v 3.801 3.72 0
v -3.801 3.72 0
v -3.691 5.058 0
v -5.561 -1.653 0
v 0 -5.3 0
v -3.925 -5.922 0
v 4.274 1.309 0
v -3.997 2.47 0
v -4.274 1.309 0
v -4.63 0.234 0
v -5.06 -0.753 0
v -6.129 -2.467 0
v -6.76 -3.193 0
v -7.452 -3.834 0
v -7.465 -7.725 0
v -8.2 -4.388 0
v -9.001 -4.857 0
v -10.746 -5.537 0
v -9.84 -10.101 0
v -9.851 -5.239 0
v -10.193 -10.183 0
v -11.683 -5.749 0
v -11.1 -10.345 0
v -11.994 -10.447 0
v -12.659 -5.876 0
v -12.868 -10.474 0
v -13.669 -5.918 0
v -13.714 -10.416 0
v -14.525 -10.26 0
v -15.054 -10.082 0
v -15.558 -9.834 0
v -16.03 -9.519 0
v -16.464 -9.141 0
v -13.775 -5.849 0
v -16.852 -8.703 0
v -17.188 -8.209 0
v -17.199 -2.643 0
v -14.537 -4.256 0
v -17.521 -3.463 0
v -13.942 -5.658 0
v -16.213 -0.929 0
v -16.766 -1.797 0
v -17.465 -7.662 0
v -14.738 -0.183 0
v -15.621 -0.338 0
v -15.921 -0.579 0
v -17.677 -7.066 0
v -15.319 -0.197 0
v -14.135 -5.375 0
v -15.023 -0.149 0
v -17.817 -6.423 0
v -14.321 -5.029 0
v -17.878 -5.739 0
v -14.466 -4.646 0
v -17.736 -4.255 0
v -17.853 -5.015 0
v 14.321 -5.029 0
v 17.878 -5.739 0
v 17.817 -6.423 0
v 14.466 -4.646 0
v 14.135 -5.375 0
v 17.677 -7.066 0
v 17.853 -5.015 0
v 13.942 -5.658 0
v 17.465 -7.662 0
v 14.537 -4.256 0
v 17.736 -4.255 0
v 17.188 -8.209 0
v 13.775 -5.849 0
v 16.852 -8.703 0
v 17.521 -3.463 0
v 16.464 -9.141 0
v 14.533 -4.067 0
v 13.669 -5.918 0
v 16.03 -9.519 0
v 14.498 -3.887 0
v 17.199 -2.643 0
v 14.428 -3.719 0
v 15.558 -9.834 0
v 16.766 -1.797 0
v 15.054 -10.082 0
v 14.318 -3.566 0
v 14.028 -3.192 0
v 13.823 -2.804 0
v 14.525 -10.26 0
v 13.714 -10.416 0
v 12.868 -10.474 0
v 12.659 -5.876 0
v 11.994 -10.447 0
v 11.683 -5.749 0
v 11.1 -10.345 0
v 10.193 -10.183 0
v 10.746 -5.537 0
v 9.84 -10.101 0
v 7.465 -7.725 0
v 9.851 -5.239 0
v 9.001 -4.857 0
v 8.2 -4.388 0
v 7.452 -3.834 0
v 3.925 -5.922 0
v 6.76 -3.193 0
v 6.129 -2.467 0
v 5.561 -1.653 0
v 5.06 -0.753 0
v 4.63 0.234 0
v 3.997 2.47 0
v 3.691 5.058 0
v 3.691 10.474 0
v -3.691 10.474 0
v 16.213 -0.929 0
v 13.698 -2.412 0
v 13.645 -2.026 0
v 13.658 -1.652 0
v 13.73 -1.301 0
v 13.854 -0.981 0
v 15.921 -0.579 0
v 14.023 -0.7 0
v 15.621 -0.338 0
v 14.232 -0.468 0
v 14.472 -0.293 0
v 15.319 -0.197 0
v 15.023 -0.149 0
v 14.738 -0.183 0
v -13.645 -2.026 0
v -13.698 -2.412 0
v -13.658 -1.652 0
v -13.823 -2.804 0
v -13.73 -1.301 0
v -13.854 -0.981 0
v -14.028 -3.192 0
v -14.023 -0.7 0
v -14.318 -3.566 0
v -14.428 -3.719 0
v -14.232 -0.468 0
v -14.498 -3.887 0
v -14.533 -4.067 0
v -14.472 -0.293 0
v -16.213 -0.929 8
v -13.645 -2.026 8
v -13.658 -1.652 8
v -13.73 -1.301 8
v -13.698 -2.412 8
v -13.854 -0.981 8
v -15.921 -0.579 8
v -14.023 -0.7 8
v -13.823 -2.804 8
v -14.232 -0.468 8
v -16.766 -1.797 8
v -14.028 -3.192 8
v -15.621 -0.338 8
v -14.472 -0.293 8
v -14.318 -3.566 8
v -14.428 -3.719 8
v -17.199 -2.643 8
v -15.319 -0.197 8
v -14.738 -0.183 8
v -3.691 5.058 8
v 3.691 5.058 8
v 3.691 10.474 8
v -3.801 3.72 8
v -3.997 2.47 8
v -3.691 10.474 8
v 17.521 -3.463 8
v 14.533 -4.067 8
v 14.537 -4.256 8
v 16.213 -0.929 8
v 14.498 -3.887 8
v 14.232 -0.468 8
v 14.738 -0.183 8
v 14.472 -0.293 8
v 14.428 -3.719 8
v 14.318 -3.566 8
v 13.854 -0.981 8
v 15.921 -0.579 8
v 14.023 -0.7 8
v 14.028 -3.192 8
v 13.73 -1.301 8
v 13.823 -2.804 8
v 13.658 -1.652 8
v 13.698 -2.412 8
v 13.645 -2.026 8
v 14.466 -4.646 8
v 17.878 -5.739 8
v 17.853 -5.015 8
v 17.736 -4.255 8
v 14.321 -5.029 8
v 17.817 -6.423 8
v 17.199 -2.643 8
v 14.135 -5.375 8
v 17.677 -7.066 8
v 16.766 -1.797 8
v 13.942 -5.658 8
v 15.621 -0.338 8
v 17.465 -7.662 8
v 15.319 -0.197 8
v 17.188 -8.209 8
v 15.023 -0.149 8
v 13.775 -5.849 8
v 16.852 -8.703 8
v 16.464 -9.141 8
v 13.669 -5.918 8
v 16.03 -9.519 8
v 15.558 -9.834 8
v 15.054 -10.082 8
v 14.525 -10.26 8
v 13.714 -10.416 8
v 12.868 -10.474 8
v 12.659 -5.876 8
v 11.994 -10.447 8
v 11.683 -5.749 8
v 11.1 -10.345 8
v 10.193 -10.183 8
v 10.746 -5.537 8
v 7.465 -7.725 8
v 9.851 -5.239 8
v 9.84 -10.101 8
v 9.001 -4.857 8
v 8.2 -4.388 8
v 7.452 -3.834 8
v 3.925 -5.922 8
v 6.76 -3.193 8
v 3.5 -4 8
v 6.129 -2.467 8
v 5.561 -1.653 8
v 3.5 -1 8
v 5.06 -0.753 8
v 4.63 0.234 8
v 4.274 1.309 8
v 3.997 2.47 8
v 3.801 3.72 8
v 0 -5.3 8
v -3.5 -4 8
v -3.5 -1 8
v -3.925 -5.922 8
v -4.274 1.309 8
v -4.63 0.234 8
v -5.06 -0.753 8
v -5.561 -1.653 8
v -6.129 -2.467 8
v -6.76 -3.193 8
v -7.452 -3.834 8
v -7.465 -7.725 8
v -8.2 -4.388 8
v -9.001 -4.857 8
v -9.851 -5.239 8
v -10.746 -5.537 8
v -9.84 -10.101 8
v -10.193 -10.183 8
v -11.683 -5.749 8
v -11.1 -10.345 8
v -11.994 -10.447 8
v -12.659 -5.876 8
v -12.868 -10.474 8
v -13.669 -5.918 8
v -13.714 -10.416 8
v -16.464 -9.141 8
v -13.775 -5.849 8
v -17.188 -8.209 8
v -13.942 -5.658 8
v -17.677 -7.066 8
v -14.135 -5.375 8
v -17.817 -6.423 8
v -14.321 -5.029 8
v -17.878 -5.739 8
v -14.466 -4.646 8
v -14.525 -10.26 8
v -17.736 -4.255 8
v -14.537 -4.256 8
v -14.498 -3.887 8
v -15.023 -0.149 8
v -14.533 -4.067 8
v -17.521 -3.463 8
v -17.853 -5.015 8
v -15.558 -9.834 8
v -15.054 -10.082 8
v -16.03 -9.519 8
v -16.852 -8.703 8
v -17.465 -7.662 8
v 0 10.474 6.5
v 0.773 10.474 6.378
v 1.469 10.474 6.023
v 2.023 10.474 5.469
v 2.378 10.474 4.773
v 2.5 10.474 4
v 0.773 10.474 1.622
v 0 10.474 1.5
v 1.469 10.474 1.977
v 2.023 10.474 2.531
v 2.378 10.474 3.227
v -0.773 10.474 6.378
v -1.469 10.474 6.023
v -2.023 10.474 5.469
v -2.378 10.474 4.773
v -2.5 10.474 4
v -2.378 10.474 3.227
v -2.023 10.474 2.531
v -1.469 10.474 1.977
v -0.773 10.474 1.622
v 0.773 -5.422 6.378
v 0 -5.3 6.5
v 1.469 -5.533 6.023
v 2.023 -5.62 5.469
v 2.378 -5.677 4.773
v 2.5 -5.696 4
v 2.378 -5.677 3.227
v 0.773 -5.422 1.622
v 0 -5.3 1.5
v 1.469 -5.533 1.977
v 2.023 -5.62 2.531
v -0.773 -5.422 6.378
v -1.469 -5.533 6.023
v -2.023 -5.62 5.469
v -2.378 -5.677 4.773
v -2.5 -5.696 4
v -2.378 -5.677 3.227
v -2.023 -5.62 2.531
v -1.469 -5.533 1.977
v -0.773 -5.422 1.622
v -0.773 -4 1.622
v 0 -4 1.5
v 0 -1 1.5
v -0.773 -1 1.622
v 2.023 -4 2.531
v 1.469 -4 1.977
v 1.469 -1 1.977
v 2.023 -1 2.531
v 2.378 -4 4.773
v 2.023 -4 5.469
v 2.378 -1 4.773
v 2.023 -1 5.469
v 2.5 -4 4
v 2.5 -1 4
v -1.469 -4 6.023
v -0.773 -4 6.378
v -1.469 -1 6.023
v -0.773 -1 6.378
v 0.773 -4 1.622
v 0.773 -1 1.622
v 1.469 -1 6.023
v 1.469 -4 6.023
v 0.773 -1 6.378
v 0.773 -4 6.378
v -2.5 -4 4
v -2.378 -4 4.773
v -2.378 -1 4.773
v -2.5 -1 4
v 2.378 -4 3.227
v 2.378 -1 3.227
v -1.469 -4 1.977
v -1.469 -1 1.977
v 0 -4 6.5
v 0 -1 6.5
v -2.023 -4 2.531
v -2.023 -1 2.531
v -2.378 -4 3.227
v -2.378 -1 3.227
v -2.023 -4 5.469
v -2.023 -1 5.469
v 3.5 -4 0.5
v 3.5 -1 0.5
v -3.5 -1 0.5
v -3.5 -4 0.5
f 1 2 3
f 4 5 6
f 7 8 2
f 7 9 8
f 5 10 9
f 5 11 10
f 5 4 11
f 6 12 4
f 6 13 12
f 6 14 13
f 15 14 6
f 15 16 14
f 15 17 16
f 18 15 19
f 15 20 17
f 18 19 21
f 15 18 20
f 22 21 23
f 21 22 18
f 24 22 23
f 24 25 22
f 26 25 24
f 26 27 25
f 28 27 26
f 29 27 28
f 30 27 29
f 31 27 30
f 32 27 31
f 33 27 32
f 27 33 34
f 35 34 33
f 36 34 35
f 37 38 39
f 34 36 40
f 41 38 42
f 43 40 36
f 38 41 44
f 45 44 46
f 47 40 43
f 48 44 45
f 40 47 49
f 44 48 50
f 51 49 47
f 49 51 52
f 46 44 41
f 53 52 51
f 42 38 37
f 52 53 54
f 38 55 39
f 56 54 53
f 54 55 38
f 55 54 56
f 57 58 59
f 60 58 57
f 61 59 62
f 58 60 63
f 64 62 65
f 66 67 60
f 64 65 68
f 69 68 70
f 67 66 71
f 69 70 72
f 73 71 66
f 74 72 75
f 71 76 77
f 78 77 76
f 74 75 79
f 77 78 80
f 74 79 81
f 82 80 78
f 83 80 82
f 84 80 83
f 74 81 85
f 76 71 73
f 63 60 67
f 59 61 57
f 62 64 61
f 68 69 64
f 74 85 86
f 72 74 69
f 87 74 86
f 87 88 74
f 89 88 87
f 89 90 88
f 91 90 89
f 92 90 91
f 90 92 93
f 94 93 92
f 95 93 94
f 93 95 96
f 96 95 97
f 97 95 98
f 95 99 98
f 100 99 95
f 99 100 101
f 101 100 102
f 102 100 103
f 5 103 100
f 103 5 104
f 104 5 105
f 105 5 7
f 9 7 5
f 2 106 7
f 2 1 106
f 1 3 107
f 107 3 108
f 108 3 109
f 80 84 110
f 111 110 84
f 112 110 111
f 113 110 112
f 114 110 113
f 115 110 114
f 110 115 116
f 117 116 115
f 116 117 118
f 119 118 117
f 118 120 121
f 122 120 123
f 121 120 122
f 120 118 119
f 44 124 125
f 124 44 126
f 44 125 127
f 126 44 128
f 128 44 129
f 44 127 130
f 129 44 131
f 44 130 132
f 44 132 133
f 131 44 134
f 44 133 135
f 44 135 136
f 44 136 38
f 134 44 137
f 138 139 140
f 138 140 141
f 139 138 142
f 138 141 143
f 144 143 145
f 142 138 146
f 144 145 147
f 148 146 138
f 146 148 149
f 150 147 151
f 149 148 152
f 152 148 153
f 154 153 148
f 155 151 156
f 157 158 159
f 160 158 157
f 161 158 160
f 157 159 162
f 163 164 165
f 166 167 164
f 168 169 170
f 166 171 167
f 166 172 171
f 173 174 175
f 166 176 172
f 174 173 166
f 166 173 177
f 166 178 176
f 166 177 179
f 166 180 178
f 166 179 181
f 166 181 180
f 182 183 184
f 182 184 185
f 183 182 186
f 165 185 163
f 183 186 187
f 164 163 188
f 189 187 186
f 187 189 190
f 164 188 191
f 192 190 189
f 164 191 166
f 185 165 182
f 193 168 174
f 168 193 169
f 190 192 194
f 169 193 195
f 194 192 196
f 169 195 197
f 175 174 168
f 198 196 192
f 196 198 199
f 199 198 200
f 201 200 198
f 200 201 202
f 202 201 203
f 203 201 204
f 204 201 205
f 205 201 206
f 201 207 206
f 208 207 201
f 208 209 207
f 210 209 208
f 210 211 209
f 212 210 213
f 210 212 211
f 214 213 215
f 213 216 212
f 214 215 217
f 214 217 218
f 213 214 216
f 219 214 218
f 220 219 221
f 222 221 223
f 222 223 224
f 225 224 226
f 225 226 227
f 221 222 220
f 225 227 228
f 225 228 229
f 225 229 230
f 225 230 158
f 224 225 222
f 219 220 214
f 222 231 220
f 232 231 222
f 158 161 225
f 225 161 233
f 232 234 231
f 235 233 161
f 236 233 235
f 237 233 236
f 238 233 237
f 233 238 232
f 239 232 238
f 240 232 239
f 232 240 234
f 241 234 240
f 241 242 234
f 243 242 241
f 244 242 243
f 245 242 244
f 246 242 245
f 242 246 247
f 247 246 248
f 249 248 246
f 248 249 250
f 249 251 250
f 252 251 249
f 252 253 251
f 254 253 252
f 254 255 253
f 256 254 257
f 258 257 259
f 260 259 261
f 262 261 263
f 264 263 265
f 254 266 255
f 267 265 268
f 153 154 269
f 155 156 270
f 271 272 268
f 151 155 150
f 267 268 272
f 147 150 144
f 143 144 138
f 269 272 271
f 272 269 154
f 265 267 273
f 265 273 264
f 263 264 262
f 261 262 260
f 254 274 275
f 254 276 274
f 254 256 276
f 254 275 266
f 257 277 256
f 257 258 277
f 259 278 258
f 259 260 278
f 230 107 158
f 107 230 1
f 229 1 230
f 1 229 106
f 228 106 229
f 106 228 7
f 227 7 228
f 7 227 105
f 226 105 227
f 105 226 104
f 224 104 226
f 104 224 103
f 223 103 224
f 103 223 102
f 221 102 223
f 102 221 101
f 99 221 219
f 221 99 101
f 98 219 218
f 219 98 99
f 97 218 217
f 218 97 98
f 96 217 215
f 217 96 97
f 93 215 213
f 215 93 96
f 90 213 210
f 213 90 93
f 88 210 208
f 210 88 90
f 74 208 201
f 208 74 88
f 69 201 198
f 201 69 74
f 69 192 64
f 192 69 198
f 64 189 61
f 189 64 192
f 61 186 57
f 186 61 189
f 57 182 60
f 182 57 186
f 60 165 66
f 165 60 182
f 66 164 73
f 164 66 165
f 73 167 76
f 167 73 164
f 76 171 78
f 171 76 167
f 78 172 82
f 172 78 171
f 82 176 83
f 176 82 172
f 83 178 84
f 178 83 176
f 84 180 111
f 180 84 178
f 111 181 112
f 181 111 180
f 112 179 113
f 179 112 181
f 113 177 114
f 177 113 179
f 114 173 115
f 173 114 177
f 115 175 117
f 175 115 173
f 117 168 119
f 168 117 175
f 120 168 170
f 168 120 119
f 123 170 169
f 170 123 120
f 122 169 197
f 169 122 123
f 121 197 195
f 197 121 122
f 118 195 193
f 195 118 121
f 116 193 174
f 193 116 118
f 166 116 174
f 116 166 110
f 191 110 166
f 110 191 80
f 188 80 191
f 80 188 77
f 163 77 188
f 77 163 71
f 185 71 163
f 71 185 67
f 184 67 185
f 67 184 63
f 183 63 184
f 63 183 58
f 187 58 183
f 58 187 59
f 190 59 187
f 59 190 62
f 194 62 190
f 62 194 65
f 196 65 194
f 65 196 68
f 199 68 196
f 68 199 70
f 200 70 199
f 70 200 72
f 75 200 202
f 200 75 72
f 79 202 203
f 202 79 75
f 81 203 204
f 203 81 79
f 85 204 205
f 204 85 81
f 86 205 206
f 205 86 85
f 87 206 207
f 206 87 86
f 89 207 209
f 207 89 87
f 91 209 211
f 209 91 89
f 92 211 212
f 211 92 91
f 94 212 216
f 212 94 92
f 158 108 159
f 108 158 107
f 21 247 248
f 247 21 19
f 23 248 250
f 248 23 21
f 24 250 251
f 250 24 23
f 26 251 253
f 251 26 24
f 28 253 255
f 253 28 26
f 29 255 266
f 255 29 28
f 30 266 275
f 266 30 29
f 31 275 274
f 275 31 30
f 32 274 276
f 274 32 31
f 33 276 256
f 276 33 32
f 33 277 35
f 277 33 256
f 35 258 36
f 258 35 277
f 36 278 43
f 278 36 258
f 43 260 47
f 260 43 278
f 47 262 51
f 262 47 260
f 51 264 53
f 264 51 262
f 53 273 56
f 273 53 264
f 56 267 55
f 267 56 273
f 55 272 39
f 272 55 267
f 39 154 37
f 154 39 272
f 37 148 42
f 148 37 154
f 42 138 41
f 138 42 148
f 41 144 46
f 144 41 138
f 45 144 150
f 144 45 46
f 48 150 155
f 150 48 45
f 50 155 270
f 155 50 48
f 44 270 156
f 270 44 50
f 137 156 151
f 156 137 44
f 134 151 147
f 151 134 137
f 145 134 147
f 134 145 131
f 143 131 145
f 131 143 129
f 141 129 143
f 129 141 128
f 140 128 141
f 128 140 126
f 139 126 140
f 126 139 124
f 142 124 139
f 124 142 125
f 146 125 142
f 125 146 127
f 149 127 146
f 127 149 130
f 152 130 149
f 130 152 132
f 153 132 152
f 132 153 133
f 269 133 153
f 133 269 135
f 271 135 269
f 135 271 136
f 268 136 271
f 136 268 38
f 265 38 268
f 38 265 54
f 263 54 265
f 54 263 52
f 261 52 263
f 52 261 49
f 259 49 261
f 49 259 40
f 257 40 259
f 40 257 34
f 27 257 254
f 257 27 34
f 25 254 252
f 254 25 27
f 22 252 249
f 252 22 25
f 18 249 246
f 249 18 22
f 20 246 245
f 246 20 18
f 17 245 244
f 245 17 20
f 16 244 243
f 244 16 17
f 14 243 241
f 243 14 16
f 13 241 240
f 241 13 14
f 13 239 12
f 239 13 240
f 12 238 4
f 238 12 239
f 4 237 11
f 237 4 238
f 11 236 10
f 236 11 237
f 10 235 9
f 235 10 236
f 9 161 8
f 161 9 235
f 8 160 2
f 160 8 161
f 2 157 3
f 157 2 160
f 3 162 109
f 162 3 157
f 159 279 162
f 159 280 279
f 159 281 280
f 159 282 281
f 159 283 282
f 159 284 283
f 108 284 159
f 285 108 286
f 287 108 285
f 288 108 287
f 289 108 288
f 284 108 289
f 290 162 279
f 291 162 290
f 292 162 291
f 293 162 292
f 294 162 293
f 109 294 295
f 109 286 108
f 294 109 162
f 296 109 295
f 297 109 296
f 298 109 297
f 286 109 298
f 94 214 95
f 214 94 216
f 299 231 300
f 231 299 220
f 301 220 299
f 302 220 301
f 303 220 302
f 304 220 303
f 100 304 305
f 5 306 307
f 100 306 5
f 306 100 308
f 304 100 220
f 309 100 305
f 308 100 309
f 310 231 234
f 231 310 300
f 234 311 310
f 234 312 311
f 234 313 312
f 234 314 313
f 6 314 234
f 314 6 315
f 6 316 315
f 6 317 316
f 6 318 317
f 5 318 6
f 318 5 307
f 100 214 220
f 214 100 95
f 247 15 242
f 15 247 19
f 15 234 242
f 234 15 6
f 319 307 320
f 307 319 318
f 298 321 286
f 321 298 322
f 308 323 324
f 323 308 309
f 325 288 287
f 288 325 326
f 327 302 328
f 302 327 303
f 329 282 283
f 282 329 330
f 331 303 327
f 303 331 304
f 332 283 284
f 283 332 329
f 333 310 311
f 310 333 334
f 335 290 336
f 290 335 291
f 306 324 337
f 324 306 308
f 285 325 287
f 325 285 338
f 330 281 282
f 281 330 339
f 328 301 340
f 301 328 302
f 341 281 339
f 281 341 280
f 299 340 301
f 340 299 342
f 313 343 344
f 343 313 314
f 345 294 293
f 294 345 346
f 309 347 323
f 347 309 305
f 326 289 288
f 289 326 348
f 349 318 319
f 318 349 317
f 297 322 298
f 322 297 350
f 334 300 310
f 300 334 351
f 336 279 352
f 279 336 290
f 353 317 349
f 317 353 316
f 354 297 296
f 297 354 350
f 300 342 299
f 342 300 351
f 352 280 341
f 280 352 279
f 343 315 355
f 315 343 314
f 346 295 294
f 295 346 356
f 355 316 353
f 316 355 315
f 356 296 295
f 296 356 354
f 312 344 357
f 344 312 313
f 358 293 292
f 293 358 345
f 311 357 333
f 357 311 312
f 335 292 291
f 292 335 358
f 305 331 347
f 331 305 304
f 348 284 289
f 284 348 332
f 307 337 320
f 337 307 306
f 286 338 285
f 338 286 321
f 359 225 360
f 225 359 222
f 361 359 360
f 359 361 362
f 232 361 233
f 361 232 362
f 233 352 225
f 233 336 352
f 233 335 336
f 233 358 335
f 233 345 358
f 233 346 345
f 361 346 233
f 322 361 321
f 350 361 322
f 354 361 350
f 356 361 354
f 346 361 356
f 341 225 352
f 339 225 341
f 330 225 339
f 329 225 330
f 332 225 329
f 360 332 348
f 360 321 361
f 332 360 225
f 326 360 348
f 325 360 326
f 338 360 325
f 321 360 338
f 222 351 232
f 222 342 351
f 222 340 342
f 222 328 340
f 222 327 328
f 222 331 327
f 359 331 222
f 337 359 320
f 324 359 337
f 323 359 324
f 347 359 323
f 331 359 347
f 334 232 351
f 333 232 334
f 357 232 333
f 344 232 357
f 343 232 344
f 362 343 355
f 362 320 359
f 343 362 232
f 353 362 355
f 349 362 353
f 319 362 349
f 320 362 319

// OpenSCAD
// fudge value is used to ensure that subtracted solids are a tad taller
// in the z dimension than the polygon being subtracted from.  This helps
// keep the resulting .stl file manifold.
fudge = 0.1;

//Smoothing
$fn=20;

//Height
hi = 8;

//Radius of the bars
bar_radius = 25.4 / 2;

//Bar notch shift to tweak (-18)
notch_shift = -18;

//Bolt length (whatever)
bolt_length = 200;

//Bolt radius
bolt_radius = 5 / 2;

//Nut thickness
nut_thick = 3;

//Nut width
nut_width = 7;

//Scale along x (0.35)
x_squish = 0.35;

//Scale along y (0.5)
y_squish = 0.5;


module poly_path41363(h) //Curvy bit drawn as vector and exported with https://www.thingiverse.com/thing:25036
{
  scale([25.4/90, -25.4/90, 1]) union()
  {
    linear_extrude(height=h)
      polygon([[37.363225,-74.226732],[37.363225,-35.840942],[38.480245,-26.362684],[40.461475,-17.507401],[43.270197,-9.273511],[46.869693,-1.659429],[51.223243,5.336428],[56.294131,11.715643],[62.045637,17.479799],[68.441043,22.630480],[75.443630,27.169268],[83.016680,31.097748],[91.123475,34.417502],[99.727296,37.130115],[108.791425,39.237168],[118.279144,40.740246],[128.153733,41.640932],[138.378475,41.940808],[139.457596,41.446563],[141.146060,40.097442],[143.102438,38.093873],[144.985304,35.636278],[146.453230,32.925085],[147.164788,30.160717],[147.130234,28.821225],[146.778553,27.543600],[146.067066,26.352893],[144.953095,25.274158],[142.014369,22.617386],[139.944666,19.870623],[138.675990,17.095690],[138.140340,14.354403],[138.269721,11.708583],[138.996132,9.220048],[140.251577,6.950616],[141.968056,4.962106],[144.077572,3.316337],[146.512127,2.075127],[149.203722,1.300296],[152.084359,1.053662],[155.086040,1.397043],[158.140767,2.392259],[161.180541,4.101128],[164.137365,6.585468],[169.731459,12.734999],[174.120853,18.729263],[177.373353,24.543913],[179.556766,30.154599],[180.738898,35.536972],[180.987557,40.666684],[180.370550,45.519384],[178.955683,50.070725],[176.810762,54.296356],[174.003595,58.171930],[170.601989,61.673096],[166.673751,64.775507],[162.286686,67.454812],[157.508602,69.686664],[152.407306,71.446712],[147.050605,72.710608],[138.835410,73.814925],[130.270192,74.226732],[121.426415,74.031376],[112.375543,73.314203],[103.189040,72.160562],[93.938371,70.655799],[75.530390,66.934295],[41.088852,59.033087],[26.198722,56.218937],[19.586441,55.394689],[13.624635,55.072788]]);
    linear_extrude(height=h)
      polygon([[13.624635,55.072788],[-13.624635,55.072788],[-19.586441,55.394689],[-26.198722,56.218937],[-41.088852,59.033087],[-75.530390,66.934295],[-93.938371,70.655799],[-103.189040,72.160562],[-112.375543,73.314203],[-121.426415,74.031376],[-130.270192,74.226732],[-138.835410,73.814925],[-147.050605,72.710608],[-152.407306,71.446712],[-157.508602,69.686664],[-162.286686,67.454812],[-166.673751,64.775507],[-170.601989,61.673096],[-174.003595,58.171930],[-176.810762,54.296356],[-178.955683,50.070725],[-180.370550,45.519384],[-180.987557,40.666684],[-180.738898,35.536972],[-179.556766,30.154599],[-177.373353,24.543913],[-174.120853,18.729263],[-169.731459,12.734999],[-164.137365,6.585468],[-161.180541,4.101128],[-158.140767,2.392259],[-155.086040,1.397043],[-152.084359,1.053662],[-149.203722,1.300296],[-146.512127,2.075127],[-144.077572,3.316337],[-141.968056,4.962106],[-140.251577,6.950616],[-138.996132,9.220048],[-138.269721,11.708583],[-138.140340,14.354403],[-138.675990,17.095690],[-139.944666,19.870623],[-142.014369,22.617386],[-144.953095,25.274158],[-146.067066,26.352893],[-146.778553,27.543600],[-147.130234,28.821225],[-147.164788,30.160717],[-146.453230,32.925085],[-144.985304,35.636278],[-143.102438,38.093873],[-141.146060,40.097442],[-139.457596,41.446563],[-138.378475,41.940808],[-128.153733,41.640932],[-118.279144,40.740246],[-108.791425,39.237168],[-99.727296,37.130115],[-91.123475,34.417502],[-83.016680,31.097748],[-75.443630,27.169268],[-68.441042,22.630480],[-62.045637,17.479799],[-56.294131,11.715643],[-51.223243,5.336428],[-46.869692,-1.659429],[-43.270197,-9.273511],[-40.461475,-17.507401],[-38.480245,-26.362684],[-37.363225,-35.840942],[-37.363225,-74.226732],[37.363225,-74.226732]]);
  }
}


difference(){
    //Bring in the polygon from Inkscape with arbitrary scale...
    scale([x_squish,y_squish,1]) poly_path41363(hi);

    //Notch out for common bar diameters 
    translate([0,notch_shift,0]) #cylinder(h=hi, r=bar_radius);
    
    //Notch out for bolt
    translate ([0,0,hi/2]) rotate([90,0,0]) #cylinder(h=bolt_length, r=bolt_radius, center=true);
    
    //Notch out for nut trap
    translate ([-nut_width/2,-4,(hi-nut_width)/2]) #cube([nut_width,nut_thick,bolt_length]);
    
}//end difference
